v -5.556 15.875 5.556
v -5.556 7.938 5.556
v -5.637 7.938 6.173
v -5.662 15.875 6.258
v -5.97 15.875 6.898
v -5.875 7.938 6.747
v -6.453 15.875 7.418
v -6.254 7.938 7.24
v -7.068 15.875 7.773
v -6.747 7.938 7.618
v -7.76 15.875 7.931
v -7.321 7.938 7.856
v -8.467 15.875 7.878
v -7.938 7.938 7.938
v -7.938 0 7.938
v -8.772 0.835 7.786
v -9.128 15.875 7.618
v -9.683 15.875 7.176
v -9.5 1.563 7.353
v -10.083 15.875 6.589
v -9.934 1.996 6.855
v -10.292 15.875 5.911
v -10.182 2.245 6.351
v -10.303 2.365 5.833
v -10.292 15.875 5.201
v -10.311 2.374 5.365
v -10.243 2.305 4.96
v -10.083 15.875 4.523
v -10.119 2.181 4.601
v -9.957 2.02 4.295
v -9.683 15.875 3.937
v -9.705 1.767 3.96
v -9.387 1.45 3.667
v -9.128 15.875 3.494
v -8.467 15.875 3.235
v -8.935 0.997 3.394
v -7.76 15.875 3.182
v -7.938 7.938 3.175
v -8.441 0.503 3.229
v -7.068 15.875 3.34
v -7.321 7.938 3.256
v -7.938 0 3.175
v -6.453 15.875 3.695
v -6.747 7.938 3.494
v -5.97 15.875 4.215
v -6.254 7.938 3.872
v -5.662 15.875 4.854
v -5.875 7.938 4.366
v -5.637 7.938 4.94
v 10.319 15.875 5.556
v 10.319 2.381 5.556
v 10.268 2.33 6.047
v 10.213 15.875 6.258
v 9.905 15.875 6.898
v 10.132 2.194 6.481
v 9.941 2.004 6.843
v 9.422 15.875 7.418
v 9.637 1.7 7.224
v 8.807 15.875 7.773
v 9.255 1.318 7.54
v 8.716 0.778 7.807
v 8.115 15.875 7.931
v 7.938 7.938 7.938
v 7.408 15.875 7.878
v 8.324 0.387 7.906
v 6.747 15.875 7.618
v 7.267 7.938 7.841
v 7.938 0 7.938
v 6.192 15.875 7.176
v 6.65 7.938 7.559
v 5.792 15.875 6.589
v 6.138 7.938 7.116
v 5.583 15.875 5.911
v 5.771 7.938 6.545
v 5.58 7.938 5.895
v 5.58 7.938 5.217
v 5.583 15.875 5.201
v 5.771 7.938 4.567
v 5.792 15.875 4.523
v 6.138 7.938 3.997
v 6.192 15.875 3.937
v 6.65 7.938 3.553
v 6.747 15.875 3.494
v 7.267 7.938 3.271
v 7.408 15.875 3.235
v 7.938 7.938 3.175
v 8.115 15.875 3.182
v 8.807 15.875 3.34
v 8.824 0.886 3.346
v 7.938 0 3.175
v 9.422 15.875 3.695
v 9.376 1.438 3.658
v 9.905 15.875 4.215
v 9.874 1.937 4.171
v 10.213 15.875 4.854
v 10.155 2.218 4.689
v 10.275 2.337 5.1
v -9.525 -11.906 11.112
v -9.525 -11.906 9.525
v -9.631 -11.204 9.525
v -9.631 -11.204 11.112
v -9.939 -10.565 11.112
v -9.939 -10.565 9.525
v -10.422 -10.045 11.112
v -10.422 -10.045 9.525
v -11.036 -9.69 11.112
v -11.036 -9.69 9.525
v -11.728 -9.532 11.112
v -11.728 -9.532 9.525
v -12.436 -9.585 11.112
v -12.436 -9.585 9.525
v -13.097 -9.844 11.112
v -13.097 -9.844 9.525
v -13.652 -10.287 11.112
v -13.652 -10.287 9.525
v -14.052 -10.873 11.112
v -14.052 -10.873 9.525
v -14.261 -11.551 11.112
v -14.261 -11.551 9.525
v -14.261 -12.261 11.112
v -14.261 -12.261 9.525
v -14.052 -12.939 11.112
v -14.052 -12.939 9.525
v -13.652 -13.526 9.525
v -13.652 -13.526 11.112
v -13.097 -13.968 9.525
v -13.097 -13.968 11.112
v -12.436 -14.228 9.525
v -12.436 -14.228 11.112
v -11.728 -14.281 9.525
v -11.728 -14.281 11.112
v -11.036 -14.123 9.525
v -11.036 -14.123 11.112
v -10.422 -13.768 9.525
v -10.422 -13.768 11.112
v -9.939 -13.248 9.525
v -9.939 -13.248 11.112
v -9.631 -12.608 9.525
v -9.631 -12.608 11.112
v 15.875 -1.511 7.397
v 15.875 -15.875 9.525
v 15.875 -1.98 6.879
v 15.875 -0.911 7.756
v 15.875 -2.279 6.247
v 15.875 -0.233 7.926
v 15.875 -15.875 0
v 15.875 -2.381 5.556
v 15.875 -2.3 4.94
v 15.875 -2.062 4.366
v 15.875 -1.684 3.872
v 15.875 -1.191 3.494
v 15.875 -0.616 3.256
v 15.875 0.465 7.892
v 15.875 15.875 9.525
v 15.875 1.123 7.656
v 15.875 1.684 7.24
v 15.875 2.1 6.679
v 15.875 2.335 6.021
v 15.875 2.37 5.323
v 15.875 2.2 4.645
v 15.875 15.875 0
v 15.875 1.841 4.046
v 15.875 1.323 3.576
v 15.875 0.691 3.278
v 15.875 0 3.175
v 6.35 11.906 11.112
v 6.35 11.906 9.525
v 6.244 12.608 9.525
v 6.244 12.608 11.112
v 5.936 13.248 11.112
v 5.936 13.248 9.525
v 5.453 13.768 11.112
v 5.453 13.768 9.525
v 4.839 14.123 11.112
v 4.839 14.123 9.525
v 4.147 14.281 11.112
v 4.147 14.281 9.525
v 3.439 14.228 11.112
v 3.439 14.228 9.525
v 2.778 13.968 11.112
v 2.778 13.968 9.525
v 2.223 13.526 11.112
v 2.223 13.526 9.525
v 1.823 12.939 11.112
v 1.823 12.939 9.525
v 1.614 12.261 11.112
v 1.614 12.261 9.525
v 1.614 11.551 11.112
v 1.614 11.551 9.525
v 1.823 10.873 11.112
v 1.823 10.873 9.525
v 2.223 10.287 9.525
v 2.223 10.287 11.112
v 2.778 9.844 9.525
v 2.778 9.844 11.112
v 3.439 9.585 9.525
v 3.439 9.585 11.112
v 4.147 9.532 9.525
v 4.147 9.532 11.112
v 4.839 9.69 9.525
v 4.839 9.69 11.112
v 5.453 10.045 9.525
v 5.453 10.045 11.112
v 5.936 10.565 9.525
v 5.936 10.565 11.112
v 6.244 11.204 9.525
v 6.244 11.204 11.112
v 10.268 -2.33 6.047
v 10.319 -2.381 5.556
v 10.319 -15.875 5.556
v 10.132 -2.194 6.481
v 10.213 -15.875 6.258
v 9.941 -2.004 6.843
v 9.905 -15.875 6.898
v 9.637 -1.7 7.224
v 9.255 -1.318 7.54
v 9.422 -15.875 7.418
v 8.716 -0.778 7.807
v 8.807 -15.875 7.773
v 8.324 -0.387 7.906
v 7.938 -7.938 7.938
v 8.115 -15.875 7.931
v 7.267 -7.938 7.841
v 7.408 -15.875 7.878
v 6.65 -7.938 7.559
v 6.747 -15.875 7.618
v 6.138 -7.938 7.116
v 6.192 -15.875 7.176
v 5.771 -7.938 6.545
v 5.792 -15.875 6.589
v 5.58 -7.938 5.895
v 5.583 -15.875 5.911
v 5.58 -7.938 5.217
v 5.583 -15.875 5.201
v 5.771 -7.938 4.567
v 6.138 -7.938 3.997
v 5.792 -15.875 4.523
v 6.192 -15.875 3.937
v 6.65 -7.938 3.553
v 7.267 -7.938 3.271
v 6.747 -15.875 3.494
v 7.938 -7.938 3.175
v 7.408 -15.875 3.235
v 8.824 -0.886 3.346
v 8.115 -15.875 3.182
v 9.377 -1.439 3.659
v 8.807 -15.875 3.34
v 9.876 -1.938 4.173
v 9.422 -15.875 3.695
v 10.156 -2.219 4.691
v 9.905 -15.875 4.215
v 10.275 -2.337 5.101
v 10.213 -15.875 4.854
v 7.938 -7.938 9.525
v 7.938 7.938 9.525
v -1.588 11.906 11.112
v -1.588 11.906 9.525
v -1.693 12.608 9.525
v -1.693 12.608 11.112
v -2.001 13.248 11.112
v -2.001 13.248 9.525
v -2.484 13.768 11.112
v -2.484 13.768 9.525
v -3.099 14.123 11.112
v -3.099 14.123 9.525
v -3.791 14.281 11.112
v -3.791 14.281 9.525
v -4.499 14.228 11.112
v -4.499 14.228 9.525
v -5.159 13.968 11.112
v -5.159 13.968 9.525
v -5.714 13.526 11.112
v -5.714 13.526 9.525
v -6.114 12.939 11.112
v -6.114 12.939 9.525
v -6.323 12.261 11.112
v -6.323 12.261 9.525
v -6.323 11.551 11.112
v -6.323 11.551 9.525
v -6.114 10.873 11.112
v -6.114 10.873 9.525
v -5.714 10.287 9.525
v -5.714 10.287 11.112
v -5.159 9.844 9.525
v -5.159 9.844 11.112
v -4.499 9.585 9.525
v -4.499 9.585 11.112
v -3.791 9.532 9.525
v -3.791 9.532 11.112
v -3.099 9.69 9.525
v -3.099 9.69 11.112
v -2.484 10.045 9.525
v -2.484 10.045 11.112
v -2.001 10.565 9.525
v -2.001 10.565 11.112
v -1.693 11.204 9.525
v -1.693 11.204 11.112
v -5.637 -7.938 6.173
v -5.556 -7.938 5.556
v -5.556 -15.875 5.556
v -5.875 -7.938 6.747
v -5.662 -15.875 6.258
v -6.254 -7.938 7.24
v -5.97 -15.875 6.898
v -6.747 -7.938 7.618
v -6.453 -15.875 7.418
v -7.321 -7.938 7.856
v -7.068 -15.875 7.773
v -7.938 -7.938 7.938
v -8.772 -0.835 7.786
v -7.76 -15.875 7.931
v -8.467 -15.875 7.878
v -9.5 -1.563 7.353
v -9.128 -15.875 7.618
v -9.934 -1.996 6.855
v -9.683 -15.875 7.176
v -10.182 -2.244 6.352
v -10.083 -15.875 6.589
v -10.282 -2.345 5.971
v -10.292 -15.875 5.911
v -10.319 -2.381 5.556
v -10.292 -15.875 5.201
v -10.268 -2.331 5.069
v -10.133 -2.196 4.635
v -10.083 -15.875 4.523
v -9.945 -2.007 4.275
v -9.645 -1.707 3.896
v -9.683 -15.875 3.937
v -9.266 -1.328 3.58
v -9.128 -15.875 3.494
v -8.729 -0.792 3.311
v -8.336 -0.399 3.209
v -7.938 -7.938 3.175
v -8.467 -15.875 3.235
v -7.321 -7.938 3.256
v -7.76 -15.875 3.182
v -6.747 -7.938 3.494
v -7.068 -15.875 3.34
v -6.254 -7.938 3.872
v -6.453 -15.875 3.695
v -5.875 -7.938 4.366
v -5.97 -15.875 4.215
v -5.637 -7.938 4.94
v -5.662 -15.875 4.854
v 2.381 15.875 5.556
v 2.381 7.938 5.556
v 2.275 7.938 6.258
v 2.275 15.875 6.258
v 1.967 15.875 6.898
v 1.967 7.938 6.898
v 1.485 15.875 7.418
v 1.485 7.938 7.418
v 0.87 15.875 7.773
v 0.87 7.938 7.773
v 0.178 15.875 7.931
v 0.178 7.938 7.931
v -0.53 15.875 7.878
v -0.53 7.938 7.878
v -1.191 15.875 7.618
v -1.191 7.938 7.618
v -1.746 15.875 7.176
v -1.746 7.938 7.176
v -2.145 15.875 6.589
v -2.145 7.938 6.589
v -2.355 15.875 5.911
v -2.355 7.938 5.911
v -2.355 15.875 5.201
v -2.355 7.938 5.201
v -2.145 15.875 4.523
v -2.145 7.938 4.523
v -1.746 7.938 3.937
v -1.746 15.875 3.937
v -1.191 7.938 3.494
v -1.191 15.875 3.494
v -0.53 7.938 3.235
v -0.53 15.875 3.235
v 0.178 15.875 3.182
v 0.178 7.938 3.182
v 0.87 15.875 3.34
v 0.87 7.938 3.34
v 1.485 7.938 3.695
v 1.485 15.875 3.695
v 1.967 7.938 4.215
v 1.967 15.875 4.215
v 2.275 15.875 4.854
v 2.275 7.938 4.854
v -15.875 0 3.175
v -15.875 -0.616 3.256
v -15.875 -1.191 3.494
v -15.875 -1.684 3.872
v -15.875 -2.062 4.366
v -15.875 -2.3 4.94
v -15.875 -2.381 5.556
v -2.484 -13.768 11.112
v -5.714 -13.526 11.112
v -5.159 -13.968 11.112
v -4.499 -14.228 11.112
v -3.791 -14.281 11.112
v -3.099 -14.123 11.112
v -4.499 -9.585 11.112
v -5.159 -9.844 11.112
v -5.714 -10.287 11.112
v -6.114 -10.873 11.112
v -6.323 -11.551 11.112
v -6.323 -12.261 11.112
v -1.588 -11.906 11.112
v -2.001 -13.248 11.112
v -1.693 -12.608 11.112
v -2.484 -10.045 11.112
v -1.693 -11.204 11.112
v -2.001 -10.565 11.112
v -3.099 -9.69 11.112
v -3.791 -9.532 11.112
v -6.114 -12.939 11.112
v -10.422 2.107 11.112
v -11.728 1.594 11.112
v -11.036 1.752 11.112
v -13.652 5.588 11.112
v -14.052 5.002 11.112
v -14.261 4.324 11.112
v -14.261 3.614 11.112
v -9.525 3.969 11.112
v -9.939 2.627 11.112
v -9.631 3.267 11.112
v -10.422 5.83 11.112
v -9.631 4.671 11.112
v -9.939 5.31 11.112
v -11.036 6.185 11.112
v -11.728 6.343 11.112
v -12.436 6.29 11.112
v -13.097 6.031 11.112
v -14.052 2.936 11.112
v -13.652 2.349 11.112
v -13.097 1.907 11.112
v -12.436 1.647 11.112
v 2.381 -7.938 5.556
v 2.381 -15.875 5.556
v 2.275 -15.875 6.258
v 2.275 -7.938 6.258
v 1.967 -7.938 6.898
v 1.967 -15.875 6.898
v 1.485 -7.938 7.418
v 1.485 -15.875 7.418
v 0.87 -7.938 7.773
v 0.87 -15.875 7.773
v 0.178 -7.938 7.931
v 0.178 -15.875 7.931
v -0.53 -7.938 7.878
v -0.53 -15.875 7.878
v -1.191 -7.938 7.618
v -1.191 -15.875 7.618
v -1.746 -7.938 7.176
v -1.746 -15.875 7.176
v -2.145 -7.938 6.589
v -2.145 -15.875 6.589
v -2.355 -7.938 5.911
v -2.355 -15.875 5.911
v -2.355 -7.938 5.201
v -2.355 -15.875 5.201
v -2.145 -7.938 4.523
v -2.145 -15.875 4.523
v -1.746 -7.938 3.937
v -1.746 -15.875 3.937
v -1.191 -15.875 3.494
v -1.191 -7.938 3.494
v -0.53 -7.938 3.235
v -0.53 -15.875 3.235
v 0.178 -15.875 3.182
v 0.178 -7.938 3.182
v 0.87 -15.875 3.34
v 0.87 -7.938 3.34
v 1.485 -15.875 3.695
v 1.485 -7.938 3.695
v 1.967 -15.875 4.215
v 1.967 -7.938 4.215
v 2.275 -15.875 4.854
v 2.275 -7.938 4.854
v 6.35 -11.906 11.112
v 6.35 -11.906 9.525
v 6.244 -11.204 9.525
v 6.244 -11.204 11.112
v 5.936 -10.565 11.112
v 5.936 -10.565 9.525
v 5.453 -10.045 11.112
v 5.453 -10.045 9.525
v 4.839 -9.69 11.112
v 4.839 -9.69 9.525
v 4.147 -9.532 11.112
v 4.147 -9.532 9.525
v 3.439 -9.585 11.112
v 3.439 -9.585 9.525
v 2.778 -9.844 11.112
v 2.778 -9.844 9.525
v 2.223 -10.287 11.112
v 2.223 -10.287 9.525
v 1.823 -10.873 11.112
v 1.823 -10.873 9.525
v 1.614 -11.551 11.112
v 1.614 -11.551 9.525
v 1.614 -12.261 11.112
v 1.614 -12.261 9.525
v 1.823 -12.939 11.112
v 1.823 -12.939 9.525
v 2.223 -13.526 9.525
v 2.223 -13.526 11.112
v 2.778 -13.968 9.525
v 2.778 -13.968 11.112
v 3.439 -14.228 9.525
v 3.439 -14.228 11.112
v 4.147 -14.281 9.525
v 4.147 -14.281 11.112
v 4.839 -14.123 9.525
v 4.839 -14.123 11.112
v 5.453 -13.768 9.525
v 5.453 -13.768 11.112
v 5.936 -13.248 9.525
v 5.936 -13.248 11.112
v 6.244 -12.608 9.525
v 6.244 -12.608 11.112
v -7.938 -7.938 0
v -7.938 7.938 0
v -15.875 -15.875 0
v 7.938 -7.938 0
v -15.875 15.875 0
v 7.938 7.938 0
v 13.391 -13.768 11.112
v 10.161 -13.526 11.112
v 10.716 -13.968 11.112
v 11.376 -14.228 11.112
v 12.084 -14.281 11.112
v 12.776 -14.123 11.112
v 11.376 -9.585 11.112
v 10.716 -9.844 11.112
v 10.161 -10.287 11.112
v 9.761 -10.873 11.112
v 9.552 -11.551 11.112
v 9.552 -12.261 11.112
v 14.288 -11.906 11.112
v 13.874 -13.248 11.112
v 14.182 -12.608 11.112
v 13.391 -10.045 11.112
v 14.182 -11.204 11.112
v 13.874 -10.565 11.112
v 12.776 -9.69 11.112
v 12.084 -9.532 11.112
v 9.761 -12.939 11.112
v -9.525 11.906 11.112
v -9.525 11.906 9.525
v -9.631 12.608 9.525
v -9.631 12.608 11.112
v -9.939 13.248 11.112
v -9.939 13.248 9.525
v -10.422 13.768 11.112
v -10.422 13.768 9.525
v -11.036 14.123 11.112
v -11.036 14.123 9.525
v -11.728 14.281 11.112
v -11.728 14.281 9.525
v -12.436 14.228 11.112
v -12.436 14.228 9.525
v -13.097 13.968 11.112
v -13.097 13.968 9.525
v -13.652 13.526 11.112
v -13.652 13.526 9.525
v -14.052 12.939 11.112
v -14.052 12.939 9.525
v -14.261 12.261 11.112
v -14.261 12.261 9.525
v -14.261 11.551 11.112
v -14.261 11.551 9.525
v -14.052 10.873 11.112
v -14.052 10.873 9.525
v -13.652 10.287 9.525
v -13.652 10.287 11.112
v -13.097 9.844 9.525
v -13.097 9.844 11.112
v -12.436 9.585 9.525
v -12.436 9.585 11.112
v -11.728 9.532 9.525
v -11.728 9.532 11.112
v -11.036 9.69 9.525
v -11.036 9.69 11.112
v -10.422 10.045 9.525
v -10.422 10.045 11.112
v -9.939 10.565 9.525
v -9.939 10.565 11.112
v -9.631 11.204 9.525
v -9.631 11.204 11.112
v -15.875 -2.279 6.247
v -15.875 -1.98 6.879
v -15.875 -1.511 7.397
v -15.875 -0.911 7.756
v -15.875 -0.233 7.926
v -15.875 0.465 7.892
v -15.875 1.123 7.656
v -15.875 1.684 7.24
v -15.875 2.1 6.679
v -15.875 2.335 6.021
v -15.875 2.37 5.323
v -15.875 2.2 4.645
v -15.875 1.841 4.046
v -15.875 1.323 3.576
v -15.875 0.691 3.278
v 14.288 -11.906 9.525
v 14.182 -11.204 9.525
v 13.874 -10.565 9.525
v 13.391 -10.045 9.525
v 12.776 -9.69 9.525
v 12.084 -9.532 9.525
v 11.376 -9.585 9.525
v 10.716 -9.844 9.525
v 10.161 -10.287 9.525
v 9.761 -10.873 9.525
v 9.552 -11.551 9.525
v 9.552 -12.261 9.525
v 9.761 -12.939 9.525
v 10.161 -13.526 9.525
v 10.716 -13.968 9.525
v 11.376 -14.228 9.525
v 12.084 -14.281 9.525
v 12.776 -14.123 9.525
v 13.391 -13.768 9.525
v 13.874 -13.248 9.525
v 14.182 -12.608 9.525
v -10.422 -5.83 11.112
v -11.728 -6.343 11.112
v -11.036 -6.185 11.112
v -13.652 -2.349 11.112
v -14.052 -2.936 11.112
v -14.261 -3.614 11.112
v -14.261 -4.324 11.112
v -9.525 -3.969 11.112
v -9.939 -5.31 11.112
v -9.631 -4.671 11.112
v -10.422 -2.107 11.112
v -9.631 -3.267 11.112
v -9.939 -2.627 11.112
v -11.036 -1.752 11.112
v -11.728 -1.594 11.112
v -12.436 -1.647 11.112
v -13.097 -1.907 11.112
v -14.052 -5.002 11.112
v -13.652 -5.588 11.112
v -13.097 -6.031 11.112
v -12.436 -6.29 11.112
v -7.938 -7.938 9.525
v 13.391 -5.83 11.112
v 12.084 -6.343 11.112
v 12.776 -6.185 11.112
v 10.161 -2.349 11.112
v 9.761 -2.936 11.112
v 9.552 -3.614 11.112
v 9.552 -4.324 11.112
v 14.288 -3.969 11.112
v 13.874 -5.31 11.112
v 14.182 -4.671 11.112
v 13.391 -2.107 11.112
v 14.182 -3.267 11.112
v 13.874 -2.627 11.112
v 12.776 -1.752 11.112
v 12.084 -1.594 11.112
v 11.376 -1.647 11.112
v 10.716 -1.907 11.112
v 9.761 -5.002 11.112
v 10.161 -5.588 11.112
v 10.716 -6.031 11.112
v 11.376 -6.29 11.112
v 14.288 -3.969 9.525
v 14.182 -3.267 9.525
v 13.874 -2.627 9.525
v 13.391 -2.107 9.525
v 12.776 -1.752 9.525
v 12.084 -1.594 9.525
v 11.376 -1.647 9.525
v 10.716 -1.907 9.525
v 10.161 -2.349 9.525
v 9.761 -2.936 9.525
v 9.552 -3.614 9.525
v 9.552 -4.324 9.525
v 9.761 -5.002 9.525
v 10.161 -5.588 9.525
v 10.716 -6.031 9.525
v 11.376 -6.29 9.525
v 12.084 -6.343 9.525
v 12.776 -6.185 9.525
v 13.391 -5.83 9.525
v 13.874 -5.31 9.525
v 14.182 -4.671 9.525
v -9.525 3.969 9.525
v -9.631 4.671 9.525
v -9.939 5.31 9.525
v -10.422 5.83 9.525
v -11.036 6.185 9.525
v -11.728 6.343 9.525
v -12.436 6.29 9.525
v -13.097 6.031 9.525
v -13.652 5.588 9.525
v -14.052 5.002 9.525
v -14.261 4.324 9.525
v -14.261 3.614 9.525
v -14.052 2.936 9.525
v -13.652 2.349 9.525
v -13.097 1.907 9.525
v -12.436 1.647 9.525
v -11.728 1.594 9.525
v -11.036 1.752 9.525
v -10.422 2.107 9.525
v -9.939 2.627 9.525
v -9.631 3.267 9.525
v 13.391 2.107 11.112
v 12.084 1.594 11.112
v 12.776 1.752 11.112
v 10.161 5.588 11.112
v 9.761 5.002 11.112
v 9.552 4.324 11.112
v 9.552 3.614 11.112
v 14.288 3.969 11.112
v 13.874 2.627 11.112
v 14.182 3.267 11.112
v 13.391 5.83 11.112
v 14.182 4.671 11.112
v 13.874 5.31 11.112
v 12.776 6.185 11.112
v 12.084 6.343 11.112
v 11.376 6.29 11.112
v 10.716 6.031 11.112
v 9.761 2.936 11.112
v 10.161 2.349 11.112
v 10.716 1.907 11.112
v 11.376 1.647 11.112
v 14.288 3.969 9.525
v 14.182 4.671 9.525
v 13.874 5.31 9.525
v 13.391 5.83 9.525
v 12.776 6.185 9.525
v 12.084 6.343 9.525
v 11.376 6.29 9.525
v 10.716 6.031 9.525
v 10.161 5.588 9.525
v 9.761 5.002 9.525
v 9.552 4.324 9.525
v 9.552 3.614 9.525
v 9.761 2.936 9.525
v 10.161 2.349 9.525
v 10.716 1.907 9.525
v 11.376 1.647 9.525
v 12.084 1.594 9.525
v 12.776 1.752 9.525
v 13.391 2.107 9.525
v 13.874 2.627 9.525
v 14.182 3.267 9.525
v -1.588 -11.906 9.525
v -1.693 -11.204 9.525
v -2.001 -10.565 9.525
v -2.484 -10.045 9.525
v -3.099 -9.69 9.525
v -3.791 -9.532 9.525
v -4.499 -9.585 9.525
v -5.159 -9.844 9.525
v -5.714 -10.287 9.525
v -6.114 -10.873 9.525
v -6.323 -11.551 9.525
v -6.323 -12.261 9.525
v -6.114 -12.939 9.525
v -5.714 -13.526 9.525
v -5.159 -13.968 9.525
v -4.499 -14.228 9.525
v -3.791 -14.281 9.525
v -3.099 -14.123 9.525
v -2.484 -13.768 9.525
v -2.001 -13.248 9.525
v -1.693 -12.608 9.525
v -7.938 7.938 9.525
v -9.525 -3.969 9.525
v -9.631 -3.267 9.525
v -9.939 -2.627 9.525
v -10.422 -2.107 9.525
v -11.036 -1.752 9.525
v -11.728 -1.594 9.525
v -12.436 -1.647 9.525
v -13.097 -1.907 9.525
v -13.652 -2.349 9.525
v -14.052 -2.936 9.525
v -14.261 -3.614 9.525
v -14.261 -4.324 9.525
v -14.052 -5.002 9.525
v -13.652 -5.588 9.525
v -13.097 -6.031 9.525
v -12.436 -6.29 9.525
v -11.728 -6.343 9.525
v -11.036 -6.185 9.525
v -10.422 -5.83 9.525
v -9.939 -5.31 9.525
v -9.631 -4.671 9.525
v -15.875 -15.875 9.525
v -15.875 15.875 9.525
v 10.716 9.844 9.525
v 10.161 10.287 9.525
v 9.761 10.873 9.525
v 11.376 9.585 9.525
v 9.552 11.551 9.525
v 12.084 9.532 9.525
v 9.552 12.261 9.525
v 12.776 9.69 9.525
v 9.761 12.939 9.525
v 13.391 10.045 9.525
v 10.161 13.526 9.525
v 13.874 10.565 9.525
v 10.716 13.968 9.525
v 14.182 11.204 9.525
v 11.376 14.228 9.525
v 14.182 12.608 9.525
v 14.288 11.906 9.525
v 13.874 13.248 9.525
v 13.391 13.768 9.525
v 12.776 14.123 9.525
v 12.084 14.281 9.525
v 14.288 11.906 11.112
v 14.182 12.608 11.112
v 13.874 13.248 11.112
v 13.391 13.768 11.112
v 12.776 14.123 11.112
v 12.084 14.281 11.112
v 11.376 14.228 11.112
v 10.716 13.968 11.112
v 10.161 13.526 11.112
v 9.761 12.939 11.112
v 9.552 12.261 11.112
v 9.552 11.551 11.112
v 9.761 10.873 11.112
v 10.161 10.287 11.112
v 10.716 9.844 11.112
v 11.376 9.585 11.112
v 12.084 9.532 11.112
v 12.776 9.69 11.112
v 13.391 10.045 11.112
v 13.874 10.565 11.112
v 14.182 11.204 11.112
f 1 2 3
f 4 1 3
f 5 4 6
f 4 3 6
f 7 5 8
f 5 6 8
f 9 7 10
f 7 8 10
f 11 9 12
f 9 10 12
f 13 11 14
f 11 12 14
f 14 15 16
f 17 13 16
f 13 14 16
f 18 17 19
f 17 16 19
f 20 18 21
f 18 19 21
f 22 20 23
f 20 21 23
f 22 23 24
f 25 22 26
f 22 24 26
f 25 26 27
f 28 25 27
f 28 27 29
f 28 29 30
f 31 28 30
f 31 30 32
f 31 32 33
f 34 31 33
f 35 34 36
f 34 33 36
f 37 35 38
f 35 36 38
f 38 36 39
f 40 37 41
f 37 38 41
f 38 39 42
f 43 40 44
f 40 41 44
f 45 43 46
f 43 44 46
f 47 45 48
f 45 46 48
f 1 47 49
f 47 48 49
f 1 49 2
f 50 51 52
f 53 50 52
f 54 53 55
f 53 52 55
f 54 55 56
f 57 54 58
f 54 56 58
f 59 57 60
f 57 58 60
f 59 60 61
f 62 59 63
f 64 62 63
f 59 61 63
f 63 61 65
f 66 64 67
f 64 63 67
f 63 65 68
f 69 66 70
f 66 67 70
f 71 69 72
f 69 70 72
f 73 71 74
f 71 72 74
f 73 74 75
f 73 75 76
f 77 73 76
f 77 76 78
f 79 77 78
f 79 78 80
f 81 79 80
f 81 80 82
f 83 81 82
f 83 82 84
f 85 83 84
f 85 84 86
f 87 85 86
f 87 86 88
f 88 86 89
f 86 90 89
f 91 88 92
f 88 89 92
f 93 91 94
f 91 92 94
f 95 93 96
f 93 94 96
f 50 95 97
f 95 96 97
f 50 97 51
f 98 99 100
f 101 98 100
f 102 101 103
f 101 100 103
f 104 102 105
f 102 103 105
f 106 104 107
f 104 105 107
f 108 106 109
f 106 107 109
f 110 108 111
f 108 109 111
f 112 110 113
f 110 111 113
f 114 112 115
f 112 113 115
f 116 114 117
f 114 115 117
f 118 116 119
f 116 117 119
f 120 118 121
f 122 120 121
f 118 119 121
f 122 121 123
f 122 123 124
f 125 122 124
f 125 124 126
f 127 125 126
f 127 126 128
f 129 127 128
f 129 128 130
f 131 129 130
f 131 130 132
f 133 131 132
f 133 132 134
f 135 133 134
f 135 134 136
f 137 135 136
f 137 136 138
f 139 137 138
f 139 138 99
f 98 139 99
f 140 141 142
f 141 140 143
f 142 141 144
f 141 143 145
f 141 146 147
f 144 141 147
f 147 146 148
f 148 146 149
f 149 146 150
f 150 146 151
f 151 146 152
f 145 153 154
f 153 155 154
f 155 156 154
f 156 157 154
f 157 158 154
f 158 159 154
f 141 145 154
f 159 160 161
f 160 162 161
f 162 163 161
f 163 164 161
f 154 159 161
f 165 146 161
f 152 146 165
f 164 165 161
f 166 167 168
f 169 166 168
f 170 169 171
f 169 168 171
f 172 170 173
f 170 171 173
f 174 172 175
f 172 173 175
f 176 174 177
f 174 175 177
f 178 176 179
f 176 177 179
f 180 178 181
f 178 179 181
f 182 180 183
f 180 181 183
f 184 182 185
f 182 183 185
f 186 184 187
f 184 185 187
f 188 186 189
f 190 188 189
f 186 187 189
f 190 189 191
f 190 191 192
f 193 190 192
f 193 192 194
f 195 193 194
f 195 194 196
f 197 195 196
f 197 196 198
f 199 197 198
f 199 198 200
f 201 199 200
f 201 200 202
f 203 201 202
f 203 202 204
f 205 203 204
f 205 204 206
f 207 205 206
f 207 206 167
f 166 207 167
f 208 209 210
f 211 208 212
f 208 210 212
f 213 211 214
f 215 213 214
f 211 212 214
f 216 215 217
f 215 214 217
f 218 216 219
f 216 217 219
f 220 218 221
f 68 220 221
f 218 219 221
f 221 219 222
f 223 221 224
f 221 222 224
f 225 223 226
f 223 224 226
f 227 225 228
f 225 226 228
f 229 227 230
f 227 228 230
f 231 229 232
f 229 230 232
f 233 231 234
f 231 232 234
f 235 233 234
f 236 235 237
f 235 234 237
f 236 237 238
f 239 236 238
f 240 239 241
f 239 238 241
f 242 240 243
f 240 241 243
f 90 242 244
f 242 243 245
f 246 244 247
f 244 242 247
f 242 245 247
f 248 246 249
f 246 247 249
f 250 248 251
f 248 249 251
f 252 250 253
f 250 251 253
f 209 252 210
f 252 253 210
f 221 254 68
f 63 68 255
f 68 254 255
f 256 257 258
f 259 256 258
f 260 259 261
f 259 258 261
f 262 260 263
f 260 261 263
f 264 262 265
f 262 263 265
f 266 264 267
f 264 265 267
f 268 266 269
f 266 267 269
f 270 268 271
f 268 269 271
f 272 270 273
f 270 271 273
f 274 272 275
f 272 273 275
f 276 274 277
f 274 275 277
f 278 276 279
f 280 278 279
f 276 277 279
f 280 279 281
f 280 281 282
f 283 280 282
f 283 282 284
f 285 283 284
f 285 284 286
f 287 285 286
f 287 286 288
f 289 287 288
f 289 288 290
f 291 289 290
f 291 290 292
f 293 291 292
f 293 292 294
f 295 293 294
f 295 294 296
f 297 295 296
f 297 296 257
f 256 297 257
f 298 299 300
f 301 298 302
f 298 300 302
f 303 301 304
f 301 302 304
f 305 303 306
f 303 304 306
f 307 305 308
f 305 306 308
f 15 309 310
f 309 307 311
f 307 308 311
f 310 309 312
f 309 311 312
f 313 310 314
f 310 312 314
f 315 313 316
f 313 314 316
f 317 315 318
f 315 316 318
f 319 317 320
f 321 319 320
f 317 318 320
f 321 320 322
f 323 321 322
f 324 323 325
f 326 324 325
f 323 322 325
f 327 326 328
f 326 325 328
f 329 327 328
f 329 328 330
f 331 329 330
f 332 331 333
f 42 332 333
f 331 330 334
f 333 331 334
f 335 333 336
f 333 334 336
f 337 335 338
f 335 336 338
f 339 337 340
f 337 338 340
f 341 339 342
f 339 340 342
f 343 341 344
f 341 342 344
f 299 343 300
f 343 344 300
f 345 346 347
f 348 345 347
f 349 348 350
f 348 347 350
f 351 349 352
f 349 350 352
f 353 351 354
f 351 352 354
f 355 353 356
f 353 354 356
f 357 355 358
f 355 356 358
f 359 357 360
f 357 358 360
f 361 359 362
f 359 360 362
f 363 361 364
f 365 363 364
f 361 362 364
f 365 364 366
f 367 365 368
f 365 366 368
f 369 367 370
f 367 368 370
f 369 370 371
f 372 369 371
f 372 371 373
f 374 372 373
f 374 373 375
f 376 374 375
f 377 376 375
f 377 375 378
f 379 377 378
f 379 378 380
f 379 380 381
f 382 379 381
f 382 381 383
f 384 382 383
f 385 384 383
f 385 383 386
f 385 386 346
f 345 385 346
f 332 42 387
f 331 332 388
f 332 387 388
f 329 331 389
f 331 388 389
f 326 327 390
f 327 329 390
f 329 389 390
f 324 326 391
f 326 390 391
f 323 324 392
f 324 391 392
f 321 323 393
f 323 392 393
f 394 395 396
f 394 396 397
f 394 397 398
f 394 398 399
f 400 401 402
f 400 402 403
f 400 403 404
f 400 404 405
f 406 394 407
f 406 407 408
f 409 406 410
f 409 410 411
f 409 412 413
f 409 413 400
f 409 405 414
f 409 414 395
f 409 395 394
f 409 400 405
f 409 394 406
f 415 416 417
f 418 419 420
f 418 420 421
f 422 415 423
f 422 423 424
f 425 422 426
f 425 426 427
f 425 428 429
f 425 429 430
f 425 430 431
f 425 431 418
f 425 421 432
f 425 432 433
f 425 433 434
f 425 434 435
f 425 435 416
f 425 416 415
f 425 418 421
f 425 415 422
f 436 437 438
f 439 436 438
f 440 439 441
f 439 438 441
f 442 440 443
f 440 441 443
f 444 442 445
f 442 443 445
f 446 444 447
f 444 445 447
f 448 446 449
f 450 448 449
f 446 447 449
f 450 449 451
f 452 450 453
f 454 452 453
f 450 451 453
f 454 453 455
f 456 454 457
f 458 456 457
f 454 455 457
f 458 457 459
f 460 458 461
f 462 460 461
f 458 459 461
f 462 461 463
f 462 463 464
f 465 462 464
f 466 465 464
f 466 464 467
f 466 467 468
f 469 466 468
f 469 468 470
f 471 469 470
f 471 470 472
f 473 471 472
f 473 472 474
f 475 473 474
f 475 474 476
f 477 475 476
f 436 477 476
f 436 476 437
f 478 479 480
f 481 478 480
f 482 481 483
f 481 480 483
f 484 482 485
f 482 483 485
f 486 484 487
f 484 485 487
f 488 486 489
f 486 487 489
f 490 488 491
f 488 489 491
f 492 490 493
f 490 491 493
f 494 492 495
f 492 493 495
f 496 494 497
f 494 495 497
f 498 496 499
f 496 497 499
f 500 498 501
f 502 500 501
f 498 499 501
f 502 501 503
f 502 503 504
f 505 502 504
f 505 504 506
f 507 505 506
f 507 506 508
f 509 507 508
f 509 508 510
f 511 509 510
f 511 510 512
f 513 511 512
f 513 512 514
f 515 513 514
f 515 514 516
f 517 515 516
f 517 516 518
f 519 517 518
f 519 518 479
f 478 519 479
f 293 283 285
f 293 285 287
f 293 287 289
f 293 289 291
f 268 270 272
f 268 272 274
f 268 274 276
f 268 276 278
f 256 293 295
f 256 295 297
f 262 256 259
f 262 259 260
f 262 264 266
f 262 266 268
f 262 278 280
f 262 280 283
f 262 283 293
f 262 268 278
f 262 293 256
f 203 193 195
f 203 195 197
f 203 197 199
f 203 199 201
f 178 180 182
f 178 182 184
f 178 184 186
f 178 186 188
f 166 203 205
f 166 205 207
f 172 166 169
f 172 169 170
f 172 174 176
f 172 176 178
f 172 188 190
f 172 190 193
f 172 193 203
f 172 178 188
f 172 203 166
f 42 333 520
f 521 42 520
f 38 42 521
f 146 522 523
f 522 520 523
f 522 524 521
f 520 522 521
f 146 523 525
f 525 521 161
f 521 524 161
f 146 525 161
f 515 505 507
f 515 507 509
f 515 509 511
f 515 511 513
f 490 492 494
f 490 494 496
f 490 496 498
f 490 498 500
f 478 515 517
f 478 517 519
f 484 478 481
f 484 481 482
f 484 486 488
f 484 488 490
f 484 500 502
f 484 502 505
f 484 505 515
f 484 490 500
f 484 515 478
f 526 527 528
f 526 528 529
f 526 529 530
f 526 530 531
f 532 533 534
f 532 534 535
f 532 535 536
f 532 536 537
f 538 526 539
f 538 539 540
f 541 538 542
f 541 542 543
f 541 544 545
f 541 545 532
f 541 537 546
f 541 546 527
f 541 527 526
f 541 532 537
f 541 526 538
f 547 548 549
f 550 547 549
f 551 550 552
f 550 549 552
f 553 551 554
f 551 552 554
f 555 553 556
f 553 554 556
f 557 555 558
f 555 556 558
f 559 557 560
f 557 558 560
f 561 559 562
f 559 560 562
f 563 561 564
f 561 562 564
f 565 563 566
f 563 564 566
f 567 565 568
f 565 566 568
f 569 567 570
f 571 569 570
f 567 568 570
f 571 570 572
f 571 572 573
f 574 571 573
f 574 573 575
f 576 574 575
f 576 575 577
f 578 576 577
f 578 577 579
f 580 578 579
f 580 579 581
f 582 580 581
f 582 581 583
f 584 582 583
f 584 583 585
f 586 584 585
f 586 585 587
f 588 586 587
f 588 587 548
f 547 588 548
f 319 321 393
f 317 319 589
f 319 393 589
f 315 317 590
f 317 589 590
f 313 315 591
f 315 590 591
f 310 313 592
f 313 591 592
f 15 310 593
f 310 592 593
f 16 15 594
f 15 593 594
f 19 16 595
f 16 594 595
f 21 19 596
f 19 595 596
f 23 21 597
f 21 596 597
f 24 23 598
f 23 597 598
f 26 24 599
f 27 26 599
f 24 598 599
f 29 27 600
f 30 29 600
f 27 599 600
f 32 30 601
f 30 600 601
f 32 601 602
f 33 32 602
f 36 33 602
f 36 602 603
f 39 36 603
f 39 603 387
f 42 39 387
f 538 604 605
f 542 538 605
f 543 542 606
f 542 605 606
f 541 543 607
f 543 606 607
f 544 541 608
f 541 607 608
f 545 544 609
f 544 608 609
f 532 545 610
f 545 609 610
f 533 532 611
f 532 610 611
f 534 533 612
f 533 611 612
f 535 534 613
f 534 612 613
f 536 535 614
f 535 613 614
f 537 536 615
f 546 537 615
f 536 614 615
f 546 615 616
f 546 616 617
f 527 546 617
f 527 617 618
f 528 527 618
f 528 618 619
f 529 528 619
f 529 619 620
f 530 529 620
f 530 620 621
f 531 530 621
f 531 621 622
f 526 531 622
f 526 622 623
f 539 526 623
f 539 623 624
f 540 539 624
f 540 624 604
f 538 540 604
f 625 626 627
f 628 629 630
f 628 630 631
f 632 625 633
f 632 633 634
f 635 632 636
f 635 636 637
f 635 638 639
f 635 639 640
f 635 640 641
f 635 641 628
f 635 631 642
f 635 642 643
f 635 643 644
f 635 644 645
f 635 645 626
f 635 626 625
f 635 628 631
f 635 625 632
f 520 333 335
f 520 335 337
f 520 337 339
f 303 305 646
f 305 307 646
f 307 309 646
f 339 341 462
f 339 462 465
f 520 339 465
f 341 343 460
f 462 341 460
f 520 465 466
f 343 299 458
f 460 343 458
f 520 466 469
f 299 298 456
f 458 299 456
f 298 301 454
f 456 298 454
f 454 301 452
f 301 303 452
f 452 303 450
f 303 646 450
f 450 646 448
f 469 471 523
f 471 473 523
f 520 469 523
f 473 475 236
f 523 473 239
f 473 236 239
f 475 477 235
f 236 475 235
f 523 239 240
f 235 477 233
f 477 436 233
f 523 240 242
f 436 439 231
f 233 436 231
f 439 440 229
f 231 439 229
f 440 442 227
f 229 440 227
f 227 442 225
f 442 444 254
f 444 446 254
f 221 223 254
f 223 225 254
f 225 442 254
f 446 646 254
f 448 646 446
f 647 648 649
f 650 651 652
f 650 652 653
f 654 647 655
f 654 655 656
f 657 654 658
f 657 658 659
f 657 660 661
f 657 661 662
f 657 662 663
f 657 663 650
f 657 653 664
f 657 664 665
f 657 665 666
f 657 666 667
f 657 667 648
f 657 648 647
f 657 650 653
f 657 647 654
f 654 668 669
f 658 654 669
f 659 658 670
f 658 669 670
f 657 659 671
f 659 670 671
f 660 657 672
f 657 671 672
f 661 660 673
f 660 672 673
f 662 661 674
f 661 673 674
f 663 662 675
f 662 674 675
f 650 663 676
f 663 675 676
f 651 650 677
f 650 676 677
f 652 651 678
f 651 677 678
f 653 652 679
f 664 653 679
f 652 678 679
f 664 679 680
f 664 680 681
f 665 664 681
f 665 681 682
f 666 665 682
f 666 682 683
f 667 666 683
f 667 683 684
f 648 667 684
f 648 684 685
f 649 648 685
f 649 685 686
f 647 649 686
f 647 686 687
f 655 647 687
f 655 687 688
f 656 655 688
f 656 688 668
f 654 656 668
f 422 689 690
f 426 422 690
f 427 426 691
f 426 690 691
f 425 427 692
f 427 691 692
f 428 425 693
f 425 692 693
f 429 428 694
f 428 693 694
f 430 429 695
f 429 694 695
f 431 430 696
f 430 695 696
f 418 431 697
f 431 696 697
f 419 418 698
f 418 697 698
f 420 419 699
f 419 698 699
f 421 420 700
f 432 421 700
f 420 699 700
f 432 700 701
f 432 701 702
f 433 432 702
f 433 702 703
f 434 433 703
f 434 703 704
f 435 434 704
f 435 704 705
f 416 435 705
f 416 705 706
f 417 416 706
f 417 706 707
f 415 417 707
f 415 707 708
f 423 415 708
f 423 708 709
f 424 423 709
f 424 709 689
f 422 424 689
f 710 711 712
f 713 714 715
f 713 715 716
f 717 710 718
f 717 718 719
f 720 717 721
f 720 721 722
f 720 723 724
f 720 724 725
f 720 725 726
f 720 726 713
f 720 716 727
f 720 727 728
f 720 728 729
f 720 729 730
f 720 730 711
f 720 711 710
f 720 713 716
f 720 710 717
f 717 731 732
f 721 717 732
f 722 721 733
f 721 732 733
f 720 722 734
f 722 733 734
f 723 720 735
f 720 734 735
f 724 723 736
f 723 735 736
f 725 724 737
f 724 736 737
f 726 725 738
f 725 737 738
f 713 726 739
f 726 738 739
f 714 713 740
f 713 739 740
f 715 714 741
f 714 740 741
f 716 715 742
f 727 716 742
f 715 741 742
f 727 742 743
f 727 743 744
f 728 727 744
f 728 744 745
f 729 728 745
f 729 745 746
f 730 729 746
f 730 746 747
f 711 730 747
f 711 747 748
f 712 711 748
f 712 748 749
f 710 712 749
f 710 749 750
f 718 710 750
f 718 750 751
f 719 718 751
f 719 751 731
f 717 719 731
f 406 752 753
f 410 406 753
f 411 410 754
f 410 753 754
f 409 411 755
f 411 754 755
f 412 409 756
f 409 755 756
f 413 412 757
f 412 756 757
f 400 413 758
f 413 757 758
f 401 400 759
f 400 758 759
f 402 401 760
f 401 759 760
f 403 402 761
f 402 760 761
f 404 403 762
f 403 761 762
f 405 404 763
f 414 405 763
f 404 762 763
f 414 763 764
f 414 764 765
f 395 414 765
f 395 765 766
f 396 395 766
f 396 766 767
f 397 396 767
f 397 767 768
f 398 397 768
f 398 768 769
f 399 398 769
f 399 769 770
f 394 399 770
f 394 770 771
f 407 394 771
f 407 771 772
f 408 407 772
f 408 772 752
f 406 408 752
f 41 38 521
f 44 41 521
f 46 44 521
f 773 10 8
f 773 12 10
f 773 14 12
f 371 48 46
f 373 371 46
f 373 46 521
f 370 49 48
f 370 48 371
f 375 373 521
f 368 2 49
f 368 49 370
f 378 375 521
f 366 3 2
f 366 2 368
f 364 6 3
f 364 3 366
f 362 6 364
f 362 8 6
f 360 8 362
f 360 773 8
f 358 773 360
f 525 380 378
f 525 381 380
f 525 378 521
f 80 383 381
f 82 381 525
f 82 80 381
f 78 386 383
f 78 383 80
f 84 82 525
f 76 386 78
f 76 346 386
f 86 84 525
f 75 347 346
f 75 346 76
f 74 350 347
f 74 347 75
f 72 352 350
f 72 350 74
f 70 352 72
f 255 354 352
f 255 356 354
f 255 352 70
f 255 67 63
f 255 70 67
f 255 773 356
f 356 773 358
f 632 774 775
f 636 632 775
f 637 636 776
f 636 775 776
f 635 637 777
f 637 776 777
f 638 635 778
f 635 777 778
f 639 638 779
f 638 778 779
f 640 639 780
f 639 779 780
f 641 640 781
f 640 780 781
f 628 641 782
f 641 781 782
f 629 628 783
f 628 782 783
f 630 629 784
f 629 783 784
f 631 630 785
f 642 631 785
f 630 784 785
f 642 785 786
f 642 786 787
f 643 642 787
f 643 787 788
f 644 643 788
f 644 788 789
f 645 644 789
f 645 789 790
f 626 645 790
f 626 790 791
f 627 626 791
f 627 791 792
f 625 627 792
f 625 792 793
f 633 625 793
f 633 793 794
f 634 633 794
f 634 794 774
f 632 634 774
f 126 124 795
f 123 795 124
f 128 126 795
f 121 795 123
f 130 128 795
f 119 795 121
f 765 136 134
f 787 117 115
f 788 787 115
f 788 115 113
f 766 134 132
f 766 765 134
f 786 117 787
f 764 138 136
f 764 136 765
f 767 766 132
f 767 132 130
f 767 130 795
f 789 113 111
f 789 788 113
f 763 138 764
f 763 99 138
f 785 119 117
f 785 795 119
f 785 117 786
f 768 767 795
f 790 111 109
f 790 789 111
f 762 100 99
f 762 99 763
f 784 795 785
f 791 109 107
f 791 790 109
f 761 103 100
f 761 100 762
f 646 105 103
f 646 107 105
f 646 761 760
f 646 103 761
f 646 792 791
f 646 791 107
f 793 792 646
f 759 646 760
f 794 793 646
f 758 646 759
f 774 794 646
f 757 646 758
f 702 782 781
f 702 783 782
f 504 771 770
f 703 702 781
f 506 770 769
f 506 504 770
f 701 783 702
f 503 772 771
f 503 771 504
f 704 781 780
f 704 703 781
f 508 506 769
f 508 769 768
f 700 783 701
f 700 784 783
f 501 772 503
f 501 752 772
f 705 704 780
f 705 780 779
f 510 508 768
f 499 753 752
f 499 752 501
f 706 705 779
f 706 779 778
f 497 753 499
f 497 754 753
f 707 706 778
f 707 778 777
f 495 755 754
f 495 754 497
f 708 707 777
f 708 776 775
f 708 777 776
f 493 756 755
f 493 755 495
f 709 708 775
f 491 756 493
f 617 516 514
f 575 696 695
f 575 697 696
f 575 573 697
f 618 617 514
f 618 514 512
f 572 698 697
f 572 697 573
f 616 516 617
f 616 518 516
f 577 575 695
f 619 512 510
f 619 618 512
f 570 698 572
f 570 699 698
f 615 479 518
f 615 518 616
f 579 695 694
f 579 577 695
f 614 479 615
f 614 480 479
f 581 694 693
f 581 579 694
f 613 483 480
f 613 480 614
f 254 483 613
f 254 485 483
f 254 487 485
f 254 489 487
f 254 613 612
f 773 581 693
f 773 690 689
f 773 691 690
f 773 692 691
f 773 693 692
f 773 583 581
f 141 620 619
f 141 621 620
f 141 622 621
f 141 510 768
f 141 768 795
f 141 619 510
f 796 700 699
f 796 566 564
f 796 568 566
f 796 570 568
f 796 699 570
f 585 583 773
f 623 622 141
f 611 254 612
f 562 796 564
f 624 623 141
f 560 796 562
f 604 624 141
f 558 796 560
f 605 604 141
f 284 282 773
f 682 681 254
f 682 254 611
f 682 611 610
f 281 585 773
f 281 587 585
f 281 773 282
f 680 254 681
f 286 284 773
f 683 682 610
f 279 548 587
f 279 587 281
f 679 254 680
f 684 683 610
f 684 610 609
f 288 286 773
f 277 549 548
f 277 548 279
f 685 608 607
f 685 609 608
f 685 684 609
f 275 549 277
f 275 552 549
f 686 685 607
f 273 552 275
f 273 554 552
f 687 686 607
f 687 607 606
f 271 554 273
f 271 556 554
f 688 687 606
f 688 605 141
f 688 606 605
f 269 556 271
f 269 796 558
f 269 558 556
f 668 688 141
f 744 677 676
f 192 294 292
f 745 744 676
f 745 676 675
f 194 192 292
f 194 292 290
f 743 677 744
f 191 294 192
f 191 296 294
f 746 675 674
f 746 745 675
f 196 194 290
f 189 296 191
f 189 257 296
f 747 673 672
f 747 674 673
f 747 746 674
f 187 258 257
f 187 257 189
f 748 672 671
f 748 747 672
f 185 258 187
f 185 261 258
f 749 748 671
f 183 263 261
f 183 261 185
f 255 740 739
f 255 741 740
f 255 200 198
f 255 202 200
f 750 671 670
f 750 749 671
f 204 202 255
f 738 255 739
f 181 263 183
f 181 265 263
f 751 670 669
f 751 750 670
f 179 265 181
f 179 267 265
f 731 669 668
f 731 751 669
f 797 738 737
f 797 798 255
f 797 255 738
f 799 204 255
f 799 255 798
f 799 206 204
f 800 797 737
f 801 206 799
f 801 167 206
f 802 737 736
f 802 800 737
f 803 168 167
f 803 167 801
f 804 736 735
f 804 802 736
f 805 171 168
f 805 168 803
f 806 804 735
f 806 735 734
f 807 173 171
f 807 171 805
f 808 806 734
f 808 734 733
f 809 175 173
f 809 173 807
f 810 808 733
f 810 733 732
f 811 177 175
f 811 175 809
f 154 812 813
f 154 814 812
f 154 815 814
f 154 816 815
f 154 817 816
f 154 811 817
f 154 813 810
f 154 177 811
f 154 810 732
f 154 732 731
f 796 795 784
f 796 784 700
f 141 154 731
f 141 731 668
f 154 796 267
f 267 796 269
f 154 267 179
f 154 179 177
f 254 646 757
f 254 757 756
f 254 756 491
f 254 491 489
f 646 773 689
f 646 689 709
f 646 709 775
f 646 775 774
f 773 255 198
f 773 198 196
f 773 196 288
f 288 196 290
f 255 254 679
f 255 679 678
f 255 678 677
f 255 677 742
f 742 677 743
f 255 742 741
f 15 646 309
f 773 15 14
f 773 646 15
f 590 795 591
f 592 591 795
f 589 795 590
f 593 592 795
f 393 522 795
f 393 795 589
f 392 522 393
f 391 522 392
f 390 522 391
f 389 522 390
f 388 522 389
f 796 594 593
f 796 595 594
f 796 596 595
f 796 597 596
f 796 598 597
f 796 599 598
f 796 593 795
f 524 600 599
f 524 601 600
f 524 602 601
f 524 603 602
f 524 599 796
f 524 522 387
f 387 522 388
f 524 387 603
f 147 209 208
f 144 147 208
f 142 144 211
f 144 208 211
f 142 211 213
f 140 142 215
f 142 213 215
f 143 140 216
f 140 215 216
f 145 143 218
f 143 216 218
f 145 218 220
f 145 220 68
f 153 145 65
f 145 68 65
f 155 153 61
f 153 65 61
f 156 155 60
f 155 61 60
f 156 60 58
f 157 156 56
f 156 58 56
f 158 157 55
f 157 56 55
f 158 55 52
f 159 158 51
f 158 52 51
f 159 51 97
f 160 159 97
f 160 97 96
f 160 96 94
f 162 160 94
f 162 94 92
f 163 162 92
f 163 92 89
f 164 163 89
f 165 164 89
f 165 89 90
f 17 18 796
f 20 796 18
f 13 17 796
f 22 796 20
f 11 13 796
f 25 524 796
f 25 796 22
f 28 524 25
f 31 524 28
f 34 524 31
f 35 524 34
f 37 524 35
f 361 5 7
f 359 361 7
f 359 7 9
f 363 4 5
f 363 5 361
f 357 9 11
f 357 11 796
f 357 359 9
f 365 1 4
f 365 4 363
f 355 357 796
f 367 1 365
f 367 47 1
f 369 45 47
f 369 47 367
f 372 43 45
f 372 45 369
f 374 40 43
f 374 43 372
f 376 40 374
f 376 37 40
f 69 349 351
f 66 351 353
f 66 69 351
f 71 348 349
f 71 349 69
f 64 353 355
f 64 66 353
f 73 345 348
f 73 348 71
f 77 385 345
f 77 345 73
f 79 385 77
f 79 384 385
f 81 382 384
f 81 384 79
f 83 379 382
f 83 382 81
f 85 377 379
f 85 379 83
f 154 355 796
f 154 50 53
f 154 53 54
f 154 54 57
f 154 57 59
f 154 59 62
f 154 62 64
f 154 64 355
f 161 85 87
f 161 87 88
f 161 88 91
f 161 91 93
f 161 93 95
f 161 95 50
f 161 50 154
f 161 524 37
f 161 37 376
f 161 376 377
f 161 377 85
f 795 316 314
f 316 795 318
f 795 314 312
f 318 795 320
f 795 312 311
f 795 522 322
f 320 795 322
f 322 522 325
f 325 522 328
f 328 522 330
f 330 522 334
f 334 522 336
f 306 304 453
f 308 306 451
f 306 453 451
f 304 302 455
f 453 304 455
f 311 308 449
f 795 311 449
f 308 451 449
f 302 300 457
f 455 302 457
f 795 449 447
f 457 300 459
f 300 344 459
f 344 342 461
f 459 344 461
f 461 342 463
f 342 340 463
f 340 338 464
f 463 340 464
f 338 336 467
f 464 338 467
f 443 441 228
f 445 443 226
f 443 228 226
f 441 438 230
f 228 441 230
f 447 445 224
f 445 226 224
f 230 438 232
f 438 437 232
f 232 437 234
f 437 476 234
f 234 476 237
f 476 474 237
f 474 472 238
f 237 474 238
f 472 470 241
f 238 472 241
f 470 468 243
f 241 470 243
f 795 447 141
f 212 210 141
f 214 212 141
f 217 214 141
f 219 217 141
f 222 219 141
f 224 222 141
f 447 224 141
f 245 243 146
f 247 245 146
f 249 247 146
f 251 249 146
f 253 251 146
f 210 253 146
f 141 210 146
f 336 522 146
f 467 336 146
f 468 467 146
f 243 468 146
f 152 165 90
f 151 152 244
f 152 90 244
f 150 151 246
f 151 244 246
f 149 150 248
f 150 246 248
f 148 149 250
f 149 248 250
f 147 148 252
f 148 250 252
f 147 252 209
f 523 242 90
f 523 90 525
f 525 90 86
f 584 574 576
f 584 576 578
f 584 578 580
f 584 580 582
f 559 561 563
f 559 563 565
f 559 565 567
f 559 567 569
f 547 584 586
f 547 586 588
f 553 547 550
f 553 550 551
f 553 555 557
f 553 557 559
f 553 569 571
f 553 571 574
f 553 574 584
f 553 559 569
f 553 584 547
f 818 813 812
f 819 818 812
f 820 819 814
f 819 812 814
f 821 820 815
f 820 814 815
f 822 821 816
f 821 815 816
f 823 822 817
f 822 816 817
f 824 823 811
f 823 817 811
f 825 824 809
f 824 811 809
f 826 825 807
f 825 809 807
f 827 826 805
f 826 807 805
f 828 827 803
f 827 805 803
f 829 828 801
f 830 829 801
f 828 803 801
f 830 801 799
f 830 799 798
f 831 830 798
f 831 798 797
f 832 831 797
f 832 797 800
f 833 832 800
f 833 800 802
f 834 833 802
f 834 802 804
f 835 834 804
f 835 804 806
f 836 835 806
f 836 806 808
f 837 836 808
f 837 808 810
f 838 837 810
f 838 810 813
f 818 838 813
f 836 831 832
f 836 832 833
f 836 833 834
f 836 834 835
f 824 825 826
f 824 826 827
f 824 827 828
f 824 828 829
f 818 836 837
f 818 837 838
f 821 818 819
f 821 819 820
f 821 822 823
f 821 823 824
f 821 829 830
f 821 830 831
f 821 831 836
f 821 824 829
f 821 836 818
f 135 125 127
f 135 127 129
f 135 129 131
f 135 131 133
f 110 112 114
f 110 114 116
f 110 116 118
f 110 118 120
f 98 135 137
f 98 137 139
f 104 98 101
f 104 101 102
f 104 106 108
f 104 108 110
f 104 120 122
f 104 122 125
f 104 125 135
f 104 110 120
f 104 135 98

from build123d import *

# Parameters (mm, degrees)
F0_W     = 31.75
F0_H     = 31.75
F0_R     = 2.38125
F1_DEPTH = 9.525
F2_DEPTH = 11.1125
F3_W     = 15.875
F3_H     = 15.875
F4_DEPTH = 12.7
F5_R     = 2.38125
F6_DEPTH = 50.8
F8_DEPTH = 50.8


with BuildPart() as f1:
    # F0 (on Top) → F1 (new body)
    with BuildSketch(Plane.XY):
        Rectangle(F0_W, F0_H)
        with Locations((-11.90625, -11.90625)):
            Circle(F0_R, mode=Mode.SUBTRACT)
        with Locations((-3.96875, -11.90625)):
            Circle(F0_R, mode=Mode.SUBTRACT)
        with Locations((-11.90625, -3.96875)):
            Circle(F0_R, mode=Mode.SUBTRACT)
        with Locations((-3.96875, -3.96875)):
            Circle(F0_R, mode=Mode.SUBTRACT)
        with Locations((3.96875, -11.90625)):
            Circle(F0_R, mode=Mode.SUBTRACT)
        with Locations((11.90625, -11.90625)):
            Circle(F0_R, mode=Mode.SUBTRACT)
        with Locations((3.96875, -3.96875)):
            Circle(F0_R, mode=Mode.SUBTRACT)
        with Locations((11.90625, -3.96875)):
            Circle(F0_R, mode=Mode.SUBTRACT)
        with Locations((-11.90625, 3.96875)):
            Circle(F0_R, mode=Mode.SUBTRACT)
        with Locations((-3.96875, 3.96875)):
            Circle(F0_R, mode=Mode.SUBTRACT)
        with Locations((-11.90625, 11.90625)):
            Circle(F0_R, mode=Mode.SUBTRACT)
        with Locations((-3.96875, 11.90625)):
            Circle(F0_R, mode=Mode.SUBTRACT)
        with Locations((3.96875, 3.96875)):
            Circle(F0_R, mode=Mode.SUBTRACT)
        with Locations((11.90625, 3.96875)):
            Circle(F0_R, mode=Mode.SUBTRACT)
        with Locations((3.96875, 11.90625)):
            Circle(F0_R, mode=Mode.SUBTRACT)
        with Locations((11.90625, 11.90625)):
            Circle(F0_R, mode=Mode.SUBTRACT)
    extrude(amount=F1_DEPTH)

    # F0 (on Top) → F2 (join)
    with BuildSketch(Plane.XY):
        with Locations((-11.90625, 11.90625)):
            Circle(F0_R)
        with Locations((-3.96875, 11.90625)):
            Circle(F0_R)
        with Locations((3.96875, 11.90625)):
            Circle(F0_R)
        with Locations((11.90625, 11.90625)):
            Circle(F0_R)
        with Locations((11.90625, 3.96875)):
            Circle(F0_R)
        with Locations((3.96875, 3.96875)):
            Circle(F0_R)
        with Locations((-3.96875, 3.96875)):
            Circle(F0_R)
        with Locations((-11.90625, 3.96875)):
            Circle(F0_R)
        with Locations((-11.90625, -3.96875)):
            Circle(F0_R)
        with Locations((-3.96875, -3.96875)):
            Circle(F0_R)
        with Locations((3.96875, -3.96875)):
            Circle(F0_R)
        with Locations((11.90625, -3.96875)):
            Circle(F0_R)
        with Locations((11.90625, -11.90625)):
            Circle(F0_R)
        with Locations((3.96875, -11.90625)):
            Circle(F0_R)
        with Locations((-3.96875, -11.90625)):
            Circle(F0_R)
        with Locations((-11.90625, -11.90625)):
            Circle(F0_R)
    extrude(amount=F2_DEPTH)

    # F3 (on face) → F4 (cut, symmetric)
    with BuildSketch(Plane.XY.offset(9.525)):
        Rectangle(F3_W, F3_H)
    extrude(amount=F4_DEPTH, both=True, mode=Mode.SUBTRACT)

    # F5 (on face) → F6 (cut)
    with BuildSketch(Plane.XZ.offset(15.875)):
        with Locations((7.9375, 5.55625)):
            Circle(F5_R)
        with Locations((0, 5.55625)):
            Circle(F5_R)
        with Locations((-7.9375, 5.55625)):
            Circle(F5_R)
    extrude(amount=-F6_DEPTH, mode=Mode.SUBTRACT)

    # F7 (on face) → F8 (cut)
    with BuildSketch(Plane(origin=(-15.875, 0, 0), x_dir=(0, -1, 0), z_dir=(-1, 0, 0))):
        with BuildLine():
            ThreePointArc((0, 3.175), (1.683798, 3.872452), (2.38125, 5.55625))
            ThreePointArc((2.38125, 5.55625), (-1.683798, 7.240048), (0, 3.175))
        make_face()
    extrude(amount=-F8_DEPTH, mode=Mode.SUBTRACT)


solid = f1.part
